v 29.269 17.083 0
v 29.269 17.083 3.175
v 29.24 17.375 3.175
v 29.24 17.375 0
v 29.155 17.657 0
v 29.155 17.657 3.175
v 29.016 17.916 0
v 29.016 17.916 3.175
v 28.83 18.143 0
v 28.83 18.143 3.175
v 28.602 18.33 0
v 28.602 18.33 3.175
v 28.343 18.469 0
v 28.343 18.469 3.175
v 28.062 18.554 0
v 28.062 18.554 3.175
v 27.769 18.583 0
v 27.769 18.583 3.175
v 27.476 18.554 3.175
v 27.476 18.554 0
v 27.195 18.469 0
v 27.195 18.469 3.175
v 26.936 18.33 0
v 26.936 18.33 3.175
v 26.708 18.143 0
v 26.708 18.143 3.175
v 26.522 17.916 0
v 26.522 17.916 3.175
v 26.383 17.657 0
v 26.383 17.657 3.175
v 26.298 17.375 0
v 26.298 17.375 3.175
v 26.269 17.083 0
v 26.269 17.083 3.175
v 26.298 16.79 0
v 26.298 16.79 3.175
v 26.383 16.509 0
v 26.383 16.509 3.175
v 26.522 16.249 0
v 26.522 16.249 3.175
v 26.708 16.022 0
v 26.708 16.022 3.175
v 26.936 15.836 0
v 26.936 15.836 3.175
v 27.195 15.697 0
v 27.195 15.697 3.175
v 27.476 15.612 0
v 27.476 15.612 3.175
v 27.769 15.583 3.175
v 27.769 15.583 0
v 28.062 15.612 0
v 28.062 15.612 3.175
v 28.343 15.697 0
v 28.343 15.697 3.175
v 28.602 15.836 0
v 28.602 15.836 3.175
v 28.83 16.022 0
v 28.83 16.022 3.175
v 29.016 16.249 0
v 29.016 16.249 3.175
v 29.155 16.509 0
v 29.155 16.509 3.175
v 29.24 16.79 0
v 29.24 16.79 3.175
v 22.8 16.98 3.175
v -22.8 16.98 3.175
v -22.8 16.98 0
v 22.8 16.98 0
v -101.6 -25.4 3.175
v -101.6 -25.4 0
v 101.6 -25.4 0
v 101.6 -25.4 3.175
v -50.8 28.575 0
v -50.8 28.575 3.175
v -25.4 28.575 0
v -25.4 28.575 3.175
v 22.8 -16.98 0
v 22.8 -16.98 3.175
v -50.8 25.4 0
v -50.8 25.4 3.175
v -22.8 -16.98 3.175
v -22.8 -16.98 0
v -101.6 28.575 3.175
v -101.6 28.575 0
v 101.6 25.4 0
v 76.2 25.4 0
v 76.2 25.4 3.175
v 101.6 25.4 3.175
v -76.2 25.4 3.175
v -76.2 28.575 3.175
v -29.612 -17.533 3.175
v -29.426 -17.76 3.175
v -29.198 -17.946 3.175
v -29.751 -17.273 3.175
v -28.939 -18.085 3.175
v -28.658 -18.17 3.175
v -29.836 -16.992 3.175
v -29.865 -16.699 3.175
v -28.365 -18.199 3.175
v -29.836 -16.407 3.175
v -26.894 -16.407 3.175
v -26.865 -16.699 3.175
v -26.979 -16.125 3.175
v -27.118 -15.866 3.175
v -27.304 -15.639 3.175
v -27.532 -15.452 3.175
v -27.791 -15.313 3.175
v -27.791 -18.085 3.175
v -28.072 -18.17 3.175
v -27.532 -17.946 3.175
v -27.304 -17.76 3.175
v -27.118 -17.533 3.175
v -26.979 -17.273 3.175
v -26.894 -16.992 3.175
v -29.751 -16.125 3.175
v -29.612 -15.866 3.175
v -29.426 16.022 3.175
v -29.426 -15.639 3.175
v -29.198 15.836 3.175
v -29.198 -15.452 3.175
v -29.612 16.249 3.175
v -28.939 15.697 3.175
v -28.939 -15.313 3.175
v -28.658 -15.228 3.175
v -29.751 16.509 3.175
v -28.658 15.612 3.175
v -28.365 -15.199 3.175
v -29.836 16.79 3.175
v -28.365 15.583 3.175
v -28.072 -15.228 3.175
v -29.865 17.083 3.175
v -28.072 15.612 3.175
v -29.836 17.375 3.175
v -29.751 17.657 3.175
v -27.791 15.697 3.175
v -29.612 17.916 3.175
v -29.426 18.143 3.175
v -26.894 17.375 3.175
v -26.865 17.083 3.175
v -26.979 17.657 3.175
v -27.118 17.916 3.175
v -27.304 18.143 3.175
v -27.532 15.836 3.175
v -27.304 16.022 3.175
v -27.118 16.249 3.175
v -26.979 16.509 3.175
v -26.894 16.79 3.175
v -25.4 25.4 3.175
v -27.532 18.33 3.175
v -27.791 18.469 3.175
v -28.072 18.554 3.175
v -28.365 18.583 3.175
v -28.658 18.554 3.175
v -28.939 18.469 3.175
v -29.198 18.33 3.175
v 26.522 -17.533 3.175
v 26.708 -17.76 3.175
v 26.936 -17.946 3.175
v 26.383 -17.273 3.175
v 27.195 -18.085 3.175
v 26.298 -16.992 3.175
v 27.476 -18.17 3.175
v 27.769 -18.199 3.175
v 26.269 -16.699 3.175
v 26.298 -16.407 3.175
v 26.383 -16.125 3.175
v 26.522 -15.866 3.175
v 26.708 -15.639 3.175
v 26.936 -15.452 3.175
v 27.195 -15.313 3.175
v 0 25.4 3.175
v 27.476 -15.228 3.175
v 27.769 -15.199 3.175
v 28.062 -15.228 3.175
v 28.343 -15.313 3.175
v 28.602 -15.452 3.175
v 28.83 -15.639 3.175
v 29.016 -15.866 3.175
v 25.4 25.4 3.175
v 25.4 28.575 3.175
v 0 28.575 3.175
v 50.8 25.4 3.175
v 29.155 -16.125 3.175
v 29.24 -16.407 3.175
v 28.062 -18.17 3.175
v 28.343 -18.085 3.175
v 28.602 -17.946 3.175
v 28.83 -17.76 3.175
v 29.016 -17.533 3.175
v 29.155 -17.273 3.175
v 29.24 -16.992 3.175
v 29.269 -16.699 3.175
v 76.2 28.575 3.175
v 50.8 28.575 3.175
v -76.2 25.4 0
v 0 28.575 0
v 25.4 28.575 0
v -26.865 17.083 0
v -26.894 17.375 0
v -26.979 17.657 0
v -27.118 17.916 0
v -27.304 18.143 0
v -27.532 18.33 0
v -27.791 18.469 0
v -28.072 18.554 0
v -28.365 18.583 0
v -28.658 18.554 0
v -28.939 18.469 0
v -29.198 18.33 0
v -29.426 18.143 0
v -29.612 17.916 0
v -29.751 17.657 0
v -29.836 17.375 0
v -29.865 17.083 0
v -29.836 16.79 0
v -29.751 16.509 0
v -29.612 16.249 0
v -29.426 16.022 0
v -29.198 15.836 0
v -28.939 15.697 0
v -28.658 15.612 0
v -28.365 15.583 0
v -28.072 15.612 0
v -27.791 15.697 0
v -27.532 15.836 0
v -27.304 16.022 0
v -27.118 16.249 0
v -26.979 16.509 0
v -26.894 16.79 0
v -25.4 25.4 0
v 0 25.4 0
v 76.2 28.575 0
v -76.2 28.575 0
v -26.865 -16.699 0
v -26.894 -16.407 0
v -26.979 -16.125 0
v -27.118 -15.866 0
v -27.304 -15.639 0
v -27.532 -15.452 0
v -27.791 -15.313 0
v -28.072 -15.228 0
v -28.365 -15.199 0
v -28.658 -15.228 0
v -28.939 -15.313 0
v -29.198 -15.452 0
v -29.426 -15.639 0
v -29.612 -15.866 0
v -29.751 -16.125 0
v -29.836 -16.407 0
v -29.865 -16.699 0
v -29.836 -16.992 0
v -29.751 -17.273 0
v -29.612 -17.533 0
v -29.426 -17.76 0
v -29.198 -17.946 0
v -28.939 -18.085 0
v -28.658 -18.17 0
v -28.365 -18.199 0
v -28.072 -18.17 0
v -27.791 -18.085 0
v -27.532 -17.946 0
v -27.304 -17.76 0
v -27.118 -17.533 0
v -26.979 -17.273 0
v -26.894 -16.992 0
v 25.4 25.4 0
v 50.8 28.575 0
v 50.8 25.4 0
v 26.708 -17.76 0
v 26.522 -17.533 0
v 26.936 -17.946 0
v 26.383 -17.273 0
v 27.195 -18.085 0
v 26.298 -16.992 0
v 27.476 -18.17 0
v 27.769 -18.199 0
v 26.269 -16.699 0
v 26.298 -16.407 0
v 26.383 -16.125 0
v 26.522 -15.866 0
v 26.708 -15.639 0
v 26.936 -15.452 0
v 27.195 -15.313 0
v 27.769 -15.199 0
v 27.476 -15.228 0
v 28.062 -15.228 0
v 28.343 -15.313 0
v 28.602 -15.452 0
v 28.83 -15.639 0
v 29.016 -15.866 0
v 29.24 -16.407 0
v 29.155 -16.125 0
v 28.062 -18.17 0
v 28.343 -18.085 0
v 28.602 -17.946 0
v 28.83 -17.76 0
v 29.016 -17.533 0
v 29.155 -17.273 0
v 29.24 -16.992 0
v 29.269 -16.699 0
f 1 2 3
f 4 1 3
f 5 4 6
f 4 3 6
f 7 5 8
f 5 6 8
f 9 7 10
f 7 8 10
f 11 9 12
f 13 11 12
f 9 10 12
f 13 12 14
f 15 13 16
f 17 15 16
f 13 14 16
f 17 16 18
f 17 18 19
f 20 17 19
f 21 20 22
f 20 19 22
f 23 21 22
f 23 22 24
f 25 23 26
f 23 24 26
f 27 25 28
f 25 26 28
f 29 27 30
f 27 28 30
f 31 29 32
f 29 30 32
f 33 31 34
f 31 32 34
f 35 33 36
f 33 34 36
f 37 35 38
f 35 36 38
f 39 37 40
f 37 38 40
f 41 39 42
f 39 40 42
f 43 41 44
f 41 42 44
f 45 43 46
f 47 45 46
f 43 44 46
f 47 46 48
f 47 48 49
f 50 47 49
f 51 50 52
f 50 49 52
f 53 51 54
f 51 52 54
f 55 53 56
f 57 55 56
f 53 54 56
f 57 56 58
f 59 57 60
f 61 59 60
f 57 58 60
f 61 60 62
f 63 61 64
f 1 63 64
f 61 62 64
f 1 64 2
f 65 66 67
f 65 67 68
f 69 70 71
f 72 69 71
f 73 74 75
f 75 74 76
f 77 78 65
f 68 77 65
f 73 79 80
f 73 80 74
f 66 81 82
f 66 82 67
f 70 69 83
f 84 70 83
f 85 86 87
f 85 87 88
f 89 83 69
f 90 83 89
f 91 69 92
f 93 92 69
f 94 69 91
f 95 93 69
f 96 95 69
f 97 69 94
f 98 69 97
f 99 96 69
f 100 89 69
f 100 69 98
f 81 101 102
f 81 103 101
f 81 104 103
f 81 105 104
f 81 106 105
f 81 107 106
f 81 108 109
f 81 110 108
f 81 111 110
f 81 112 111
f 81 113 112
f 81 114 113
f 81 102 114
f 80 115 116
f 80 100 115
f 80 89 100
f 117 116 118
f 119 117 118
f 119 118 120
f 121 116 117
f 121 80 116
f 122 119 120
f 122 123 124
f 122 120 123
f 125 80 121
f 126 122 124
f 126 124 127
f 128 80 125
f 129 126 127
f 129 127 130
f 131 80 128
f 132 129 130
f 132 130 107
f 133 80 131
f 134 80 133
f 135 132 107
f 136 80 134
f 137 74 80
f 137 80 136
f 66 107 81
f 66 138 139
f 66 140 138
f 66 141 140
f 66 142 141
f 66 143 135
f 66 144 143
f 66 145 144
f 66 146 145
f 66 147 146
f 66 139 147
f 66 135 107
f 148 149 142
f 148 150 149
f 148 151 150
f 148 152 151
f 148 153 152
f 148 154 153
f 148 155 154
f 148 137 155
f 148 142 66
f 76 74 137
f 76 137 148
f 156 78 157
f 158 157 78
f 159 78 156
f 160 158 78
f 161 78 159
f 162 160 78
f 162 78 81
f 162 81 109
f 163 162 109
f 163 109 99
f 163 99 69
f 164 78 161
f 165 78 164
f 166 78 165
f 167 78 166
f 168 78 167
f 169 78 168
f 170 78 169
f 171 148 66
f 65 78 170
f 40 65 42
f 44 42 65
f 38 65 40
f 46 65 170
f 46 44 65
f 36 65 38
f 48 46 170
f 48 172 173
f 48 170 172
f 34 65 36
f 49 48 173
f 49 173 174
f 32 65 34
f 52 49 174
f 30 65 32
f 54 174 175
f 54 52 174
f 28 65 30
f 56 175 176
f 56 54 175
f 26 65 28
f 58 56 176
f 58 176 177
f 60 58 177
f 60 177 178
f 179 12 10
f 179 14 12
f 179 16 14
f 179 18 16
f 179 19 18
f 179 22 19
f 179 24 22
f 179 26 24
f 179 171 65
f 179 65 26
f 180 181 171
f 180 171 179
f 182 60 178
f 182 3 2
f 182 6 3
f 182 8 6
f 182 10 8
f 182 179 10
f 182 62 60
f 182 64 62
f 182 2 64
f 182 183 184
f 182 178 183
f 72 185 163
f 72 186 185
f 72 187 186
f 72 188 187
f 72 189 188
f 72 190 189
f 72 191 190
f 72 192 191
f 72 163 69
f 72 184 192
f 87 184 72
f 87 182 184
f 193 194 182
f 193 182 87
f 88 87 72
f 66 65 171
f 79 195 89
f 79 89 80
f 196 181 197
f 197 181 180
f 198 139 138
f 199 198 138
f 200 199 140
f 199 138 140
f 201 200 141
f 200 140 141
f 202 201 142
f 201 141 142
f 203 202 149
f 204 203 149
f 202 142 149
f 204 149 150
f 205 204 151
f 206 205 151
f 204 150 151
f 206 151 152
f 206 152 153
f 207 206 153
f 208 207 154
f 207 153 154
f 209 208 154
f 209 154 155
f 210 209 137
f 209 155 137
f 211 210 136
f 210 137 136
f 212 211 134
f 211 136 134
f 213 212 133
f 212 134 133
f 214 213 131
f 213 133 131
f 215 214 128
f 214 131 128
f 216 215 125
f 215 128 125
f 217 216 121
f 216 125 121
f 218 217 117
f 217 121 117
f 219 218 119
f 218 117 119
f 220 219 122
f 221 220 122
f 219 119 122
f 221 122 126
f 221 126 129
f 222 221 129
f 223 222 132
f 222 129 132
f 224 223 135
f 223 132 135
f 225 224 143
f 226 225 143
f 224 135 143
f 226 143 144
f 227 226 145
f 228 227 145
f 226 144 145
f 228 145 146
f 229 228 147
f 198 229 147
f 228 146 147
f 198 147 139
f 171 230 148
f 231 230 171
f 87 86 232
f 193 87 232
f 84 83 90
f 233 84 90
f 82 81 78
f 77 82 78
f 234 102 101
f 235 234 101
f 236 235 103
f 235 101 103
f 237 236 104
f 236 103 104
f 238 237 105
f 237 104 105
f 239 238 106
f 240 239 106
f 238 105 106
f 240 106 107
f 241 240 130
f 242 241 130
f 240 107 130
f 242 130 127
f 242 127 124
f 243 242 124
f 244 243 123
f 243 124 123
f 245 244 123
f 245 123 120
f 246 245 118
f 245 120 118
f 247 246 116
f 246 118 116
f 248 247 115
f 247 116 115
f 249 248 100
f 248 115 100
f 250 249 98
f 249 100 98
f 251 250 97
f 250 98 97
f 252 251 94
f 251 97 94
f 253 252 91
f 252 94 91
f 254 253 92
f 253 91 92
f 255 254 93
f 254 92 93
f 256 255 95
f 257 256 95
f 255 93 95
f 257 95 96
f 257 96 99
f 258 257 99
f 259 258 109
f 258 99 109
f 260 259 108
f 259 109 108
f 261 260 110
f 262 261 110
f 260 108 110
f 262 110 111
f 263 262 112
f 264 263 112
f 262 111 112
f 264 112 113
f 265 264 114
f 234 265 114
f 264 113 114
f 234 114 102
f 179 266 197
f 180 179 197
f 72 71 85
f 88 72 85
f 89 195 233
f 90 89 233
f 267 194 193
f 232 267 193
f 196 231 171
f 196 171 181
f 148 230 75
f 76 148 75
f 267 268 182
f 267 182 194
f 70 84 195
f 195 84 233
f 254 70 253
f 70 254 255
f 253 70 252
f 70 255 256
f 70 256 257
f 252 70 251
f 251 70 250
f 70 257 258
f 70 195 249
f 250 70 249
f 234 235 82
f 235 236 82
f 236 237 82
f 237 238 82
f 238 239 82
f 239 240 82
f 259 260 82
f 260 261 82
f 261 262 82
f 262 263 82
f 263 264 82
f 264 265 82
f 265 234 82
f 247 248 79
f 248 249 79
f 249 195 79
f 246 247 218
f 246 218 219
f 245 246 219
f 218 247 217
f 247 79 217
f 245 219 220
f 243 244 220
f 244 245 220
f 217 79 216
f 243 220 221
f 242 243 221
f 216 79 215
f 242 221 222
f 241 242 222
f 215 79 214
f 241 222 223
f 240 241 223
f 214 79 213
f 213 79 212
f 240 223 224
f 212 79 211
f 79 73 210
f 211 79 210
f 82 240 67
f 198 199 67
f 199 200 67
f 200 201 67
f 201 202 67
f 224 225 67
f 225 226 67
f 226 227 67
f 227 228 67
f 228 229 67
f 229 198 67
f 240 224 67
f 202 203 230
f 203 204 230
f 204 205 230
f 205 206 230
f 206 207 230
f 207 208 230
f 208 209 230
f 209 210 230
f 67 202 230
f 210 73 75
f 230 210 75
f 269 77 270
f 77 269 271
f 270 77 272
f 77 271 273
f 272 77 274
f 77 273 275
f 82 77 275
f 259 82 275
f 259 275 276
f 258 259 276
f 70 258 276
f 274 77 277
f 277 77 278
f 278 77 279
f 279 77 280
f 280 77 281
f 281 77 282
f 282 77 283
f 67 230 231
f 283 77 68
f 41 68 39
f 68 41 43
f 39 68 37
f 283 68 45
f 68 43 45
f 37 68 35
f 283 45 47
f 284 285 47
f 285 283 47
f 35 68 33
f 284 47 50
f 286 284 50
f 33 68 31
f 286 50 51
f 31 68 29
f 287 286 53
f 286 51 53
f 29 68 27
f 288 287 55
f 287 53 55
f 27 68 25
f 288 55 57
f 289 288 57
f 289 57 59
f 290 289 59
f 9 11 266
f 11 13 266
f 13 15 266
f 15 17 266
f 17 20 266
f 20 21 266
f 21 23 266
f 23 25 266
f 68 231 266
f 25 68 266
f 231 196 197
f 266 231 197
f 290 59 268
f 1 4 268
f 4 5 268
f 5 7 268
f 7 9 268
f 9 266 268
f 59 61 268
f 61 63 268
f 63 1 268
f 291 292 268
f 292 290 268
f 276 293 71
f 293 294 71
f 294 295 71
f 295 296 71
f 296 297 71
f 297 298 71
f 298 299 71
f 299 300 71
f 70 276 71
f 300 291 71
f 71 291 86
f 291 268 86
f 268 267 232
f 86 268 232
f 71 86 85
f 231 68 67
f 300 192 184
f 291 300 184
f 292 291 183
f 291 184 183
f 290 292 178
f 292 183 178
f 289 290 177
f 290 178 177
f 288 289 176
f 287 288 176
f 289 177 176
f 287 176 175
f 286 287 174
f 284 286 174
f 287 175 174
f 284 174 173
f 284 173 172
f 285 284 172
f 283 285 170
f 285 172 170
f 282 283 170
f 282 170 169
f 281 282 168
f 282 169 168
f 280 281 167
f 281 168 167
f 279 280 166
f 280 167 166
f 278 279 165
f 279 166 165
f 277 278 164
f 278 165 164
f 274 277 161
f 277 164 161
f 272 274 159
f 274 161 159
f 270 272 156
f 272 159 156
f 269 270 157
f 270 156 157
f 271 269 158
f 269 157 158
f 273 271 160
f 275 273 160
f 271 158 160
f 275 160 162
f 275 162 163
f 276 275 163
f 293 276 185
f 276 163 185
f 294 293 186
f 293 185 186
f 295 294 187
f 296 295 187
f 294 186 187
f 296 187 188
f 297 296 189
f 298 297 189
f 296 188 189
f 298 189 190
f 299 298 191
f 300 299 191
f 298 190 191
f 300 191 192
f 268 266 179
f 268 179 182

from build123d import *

# Parameters (mm, degrees)
SKETCH1_W           = 203.2
SKETCH1_H           = 50.8
BOSS_EXTRUDE1_DEPTH = 3.175
SKETCH2_R           = 1.5
SKETCH2_W           = 45.6
SKETCH2_H           = 33.96
CUT_EXTRUDE1_DEPTH  = 3.175
SKETCH3_W           = 25.4
SKETCH3_H           = 3.175
BOSS_EXTRUDE2_DEPTH = 3.175


with BuildPart() as part:
    # Sketch1 → Boss-Extrude1 (new body)
    with BuildSketch(Plane.XY):
        Rectangle(SKETCH1_W, SKETCH1_H)
    extrude(amount=BOSS_EXTRUDE1_DEPTH)

    # Sketch2 → Cut-Extrude1 (cut)
    with BuildSketch(Plane.XY.offset(3.175)):
        with Locations((27.769072573, 17.082783056)):
            Circle(SKETCH2_R)
        with Locations((-28.364927427, 17.082783056)):
            Circle(SKETCH2_R)
        with Locations((-28.364927427, -16.699216944)):
            Circle(SKETCH2_R)
        with Locations((27.769072573, -16.699216944)):
            Circle(SKETCH2_R)
        Rectangle(SKETCH2_W, SKETCH2_H)
    extrude(amount=-CUT_EXTRUDE1_DEPTH, mode=Mode.SUBTRACT)

    # Sketch3 → Boss-Extrude2 (add)
    with BuildSketch(Plane.XY.offset(3.175)):
        with Locations((-38.1, 26.9875)):
            Rectangle(SKETCH3_W, SKETCH3_H)
        with Locations((-88.9, 26.9875)):
            Rectangle(SKETCH3_W, SKETCH3_H)
        with Locations((12.7, 26.9875)):
            Rectangle(SKETCH3_W, SKETCH3_H)
        with Locations((63.5, 26.9875)):
            Rectangle(SKETCH3_W, SKETCH3_H)
    extrude(amount=-BOSS_EXTRUDE2_DEPTH)


solid = part.part
